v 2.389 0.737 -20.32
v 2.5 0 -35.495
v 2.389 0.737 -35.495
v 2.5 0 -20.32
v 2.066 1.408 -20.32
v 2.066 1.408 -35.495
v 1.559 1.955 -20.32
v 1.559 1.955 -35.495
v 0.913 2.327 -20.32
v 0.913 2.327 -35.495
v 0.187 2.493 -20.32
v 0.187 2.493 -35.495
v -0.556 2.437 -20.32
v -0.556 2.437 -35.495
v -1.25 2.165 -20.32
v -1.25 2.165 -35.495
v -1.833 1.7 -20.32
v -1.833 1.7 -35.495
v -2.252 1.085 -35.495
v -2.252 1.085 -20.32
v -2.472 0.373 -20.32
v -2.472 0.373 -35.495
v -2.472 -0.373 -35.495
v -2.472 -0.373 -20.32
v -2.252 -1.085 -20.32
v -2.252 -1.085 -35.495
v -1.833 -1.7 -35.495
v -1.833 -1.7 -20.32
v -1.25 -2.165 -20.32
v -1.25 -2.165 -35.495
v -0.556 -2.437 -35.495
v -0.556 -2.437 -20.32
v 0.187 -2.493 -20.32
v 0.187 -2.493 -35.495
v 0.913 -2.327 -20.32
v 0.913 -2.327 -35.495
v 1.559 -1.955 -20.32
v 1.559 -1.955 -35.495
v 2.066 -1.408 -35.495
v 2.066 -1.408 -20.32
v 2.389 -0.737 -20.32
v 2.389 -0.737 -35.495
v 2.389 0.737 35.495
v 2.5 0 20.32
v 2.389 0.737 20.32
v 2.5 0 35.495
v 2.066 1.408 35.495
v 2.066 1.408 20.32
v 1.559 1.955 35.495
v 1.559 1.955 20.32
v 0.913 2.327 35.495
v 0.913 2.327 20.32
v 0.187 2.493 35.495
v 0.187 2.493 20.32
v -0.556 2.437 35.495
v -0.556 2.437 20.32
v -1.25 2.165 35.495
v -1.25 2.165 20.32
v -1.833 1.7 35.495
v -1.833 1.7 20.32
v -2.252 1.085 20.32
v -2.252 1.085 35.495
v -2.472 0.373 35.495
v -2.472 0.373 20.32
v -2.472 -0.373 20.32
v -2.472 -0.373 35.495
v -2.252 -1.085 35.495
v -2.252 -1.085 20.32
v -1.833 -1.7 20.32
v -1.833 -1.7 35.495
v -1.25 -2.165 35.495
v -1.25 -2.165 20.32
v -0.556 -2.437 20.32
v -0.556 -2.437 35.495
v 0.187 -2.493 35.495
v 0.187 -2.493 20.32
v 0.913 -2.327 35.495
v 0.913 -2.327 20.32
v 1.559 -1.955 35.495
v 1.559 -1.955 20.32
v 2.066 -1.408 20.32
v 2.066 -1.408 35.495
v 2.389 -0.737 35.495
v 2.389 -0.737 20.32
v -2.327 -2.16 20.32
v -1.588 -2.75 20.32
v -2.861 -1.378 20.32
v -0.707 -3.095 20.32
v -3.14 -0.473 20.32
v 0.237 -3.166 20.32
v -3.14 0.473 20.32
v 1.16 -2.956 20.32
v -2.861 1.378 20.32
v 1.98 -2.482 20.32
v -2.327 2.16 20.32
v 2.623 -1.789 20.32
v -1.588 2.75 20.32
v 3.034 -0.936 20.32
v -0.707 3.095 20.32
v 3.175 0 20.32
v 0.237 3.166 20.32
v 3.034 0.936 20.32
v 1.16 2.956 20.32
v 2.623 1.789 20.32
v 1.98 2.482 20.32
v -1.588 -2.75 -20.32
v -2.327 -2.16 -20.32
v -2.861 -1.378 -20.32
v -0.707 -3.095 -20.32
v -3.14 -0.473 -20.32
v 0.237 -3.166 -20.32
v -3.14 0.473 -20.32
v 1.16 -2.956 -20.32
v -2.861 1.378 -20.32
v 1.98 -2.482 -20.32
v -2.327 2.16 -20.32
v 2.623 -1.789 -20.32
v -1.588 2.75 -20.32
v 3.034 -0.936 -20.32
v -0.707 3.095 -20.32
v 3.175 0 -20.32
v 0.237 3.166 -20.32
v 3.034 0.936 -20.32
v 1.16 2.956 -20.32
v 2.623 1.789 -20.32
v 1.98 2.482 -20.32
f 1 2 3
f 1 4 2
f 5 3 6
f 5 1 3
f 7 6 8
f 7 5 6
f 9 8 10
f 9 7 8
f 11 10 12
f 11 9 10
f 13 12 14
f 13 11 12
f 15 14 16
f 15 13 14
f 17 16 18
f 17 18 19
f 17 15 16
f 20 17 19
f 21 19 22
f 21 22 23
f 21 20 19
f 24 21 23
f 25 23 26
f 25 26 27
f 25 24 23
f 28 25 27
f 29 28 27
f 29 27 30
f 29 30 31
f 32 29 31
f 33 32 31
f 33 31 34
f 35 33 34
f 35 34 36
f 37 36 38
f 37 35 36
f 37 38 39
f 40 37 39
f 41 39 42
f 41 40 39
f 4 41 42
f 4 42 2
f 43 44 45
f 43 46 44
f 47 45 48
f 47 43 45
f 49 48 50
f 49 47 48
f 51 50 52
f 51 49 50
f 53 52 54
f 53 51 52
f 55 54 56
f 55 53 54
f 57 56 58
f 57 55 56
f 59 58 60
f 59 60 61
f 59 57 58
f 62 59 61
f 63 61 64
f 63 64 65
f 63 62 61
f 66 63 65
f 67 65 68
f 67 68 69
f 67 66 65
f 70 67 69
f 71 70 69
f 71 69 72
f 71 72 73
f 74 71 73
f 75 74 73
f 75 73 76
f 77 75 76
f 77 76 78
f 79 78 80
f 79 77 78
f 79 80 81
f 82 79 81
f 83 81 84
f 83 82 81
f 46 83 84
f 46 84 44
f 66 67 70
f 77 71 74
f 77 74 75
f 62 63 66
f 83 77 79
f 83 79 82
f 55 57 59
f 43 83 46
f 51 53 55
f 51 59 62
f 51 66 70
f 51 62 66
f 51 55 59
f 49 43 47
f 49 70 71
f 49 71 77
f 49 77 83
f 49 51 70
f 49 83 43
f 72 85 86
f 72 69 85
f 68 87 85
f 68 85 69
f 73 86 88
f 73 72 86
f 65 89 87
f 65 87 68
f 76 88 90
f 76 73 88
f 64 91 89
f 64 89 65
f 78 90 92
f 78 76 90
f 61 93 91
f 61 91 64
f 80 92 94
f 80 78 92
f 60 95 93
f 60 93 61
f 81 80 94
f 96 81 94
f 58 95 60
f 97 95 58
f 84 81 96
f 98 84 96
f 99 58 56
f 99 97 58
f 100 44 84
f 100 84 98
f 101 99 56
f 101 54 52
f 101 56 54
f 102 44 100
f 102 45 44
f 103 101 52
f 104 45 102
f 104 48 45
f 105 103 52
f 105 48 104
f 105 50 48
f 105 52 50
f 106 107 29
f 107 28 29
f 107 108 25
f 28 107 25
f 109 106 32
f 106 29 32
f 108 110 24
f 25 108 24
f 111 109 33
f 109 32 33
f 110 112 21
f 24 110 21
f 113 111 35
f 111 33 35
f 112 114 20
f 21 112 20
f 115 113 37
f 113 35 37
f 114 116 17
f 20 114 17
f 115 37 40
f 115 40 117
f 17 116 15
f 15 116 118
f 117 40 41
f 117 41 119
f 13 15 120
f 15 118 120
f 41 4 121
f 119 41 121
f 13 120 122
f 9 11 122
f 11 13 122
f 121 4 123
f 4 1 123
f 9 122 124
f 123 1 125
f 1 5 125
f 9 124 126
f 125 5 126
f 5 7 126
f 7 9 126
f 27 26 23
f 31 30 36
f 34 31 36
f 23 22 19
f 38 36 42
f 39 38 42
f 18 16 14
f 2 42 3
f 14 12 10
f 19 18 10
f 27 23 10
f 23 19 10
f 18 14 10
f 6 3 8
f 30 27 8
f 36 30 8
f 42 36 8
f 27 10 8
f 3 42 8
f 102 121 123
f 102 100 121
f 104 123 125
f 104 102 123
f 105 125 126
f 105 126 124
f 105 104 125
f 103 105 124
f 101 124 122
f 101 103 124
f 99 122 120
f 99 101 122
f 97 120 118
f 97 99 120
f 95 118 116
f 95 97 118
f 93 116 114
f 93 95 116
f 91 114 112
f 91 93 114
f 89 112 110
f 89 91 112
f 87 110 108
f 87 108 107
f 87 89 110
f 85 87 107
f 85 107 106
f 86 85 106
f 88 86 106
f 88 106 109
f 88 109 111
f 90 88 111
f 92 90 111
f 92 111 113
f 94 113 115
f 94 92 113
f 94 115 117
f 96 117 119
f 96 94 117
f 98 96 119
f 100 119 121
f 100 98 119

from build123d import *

# Parameters (mm, degrees)
SKETCH2_R                = 2.5
BOSS_EXTRUDE1_DEPTH      = 35.494976
BOSS_EXTRUDE1_DEPTH_BACK = 35.494976
SKETCH3_R                = 3.175
BOSS_EXTRUDE2_DEPTH      = 20.32
BOSS_EXTRUDE2_DEPTH_BACK = 20.32


with BuildPart() as part:
    # Sketch2 → Boss-Extrude1 (new body, two sides)
    with BuildSketch(Plane.XY) as boss_extrude1_sk:
        Circle(SKETCH2_R)
    extrude(amount=BOSS_EXTRUDE1_DEPTH)
    extrude(boss_extrude1_sk.sketch, amount=-BOSS_EXTRUDE1_DEPTH_BACK)

    # Sketch3 → Boss-Extrude2 (add, two sides)
    with BuildSketch(Plane.XY) as boss_extrude2_sk:
        Circle(SKETCH3_R)
    extrude(amount=BOSS_EXTRUDE2_DEPTH)
    extrude(boss_extrude2_sk.sketch, amount=-BOSS_EXTRUDE2_DEPTH_BACK)


solid = part.part
